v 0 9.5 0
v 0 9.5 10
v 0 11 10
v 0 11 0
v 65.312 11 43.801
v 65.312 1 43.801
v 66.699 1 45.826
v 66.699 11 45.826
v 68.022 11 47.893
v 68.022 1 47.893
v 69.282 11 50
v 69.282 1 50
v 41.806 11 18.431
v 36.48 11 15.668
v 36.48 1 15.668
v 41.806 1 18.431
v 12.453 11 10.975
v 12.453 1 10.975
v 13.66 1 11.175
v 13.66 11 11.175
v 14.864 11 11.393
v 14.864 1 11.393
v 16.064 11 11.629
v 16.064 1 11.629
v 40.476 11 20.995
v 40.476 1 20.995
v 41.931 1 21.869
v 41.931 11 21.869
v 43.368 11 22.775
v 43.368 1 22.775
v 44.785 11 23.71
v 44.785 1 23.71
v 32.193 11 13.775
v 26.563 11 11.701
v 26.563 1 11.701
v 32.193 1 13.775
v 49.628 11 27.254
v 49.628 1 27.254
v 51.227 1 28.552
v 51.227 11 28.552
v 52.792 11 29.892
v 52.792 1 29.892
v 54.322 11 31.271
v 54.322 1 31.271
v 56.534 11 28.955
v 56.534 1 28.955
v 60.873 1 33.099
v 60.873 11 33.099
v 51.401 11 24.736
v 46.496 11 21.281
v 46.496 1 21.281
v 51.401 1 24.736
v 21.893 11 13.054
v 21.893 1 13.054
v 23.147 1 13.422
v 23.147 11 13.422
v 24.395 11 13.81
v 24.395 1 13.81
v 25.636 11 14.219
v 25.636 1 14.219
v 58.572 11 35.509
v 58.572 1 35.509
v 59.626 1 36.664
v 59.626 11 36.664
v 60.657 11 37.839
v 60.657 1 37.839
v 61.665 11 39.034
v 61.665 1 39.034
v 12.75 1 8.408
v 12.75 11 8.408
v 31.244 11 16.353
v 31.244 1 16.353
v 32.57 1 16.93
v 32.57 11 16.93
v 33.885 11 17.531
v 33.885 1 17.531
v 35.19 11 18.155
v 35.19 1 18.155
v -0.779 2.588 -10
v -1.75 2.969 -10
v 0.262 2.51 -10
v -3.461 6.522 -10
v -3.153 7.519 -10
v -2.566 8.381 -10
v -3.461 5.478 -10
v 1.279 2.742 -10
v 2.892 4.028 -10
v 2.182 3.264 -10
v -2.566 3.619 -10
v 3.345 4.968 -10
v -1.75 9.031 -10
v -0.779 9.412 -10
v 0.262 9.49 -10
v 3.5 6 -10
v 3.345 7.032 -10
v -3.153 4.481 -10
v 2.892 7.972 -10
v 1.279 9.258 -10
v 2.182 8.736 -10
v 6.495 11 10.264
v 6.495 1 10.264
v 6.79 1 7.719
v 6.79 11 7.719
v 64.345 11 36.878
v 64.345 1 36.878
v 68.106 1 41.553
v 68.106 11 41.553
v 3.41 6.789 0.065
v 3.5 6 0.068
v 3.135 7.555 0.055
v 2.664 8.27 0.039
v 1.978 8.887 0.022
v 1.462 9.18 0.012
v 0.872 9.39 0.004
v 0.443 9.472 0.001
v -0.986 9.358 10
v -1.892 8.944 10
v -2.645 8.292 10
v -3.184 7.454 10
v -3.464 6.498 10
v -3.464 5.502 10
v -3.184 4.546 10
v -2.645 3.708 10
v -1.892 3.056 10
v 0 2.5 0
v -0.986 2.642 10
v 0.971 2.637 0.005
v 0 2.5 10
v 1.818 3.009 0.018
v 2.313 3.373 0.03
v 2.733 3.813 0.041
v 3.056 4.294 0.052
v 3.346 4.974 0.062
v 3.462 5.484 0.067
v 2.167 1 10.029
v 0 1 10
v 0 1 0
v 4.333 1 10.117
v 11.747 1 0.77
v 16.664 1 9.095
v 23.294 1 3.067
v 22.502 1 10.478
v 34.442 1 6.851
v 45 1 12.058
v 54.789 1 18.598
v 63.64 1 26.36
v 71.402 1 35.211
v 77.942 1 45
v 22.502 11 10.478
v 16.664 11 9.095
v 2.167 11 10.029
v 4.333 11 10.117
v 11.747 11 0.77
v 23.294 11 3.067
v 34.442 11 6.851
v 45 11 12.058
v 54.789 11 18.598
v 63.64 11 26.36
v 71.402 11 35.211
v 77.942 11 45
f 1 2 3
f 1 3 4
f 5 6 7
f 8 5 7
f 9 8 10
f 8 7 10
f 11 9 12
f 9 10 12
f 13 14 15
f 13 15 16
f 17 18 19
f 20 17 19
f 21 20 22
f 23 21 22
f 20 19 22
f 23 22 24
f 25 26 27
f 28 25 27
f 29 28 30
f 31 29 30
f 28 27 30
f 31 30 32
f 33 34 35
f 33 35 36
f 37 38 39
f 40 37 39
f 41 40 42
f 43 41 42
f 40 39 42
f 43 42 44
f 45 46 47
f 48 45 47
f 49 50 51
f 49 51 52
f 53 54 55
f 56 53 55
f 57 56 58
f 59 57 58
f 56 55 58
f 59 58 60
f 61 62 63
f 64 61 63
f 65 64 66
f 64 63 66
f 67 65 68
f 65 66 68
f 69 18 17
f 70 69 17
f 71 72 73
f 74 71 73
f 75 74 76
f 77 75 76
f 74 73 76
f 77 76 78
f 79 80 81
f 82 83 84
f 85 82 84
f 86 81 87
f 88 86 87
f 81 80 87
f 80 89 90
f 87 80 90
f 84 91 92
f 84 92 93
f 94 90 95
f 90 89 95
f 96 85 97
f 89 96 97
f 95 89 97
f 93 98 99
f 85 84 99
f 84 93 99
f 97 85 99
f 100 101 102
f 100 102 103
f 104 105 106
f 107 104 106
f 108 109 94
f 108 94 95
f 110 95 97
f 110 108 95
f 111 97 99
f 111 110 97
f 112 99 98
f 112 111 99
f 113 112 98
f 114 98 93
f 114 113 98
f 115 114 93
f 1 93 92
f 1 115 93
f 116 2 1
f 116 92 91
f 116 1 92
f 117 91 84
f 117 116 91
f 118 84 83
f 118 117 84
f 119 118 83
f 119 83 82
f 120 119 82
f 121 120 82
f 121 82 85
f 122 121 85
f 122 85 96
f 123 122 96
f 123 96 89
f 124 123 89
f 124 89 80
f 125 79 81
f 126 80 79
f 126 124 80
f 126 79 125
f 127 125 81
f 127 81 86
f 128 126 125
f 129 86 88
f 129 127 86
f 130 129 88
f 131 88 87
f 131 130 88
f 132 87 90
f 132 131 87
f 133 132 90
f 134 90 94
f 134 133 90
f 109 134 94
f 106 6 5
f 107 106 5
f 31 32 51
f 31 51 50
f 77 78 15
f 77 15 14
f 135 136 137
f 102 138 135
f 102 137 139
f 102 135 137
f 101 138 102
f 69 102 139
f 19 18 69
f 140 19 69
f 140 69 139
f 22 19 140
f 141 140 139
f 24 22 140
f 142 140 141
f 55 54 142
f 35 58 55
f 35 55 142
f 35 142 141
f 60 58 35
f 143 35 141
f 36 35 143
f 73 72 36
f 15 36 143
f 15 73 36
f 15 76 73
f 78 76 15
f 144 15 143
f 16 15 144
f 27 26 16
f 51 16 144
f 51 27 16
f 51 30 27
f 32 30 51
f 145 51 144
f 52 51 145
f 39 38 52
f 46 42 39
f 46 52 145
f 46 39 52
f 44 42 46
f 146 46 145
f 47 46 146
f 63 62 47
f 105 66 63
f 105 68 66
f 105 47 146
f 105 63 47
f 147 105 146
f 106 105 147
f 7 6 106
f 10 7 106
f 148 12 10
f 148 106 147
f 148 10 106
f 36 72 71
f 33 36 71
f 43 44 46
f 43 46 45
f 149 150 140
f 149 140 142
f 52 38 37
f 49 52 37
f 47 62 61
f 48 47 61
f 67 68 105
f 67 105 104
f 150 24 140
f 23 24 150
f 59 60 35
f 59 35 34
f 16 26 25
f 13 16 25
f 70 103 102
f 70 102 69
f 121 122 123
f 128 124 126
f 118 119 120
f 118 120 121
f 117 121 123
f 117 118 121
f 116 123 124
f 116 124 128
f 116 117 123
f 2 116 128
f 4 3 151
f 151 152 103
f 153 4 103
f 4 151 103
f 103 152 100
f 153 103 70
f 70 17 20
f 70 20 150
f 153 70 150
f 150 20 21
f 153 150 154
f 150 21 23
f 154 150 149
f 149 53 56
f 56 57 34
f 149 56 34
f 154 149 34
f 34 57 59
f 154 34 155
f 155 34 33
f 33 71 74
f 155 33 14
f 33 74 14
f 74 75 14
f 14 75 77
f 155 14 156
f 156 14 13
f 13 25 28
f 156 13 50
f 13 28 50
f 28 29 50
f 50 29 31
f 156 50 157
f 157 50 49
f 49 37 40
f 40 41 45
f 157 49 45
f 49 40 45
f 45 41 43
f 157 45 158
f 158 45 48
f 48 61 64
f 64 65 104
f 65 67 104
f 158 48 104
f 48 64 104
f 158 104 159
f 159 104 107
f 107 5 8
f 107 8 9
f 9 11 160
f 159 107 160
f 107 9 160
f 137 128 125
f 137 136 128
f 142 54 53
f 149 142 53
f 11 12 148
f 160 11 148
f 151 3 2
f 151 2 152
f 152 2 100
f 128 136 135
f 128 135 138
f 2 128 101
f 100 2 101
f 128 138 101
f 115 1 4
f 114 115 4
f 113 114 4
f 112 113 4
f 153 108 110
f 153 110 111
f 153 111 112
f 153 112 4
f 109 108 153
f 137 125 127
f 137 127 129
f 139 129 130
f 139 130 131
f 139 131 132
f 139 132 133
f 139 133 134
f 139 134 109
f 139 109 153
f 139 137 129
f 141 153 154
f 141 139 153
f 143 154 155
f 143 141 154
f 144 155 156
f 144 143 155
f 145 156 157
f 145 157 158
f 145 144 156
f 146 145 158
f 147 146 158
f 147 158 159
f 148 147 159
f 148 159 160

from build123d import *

# Parameters (mm, degrees)
SKETCH001_R                = 3.5
EXTRUDE001_DEPTH           = 10
SKETCH012_W                = 6
SKETCH012_H                = 10
EXTRUDE013_DEPTH           = 2.5
EXTRUDE013_PLACEMENT_ANGLE = 51.18
SKETCH011_W                = 6
SKETCH011_H                = 10
EXTRUDE012_DEPTH           = 2.5
EXTRUDE012_PLACEMENT_ANGLE = 43.68
SKETCH010_W                = 6
SKETCH010_H                = 10
EXTRUDE011_DEPTH           = 2.5
EXTRUDE011_PLACEMENT_ANGLE = 35.16
SKETCH009_W                = 6
SKETCH009_H                = 10
EXTRUDE010_DEPTH           = 2.5
EXTRUDE010_PLACEMENT_ANGLE = 27.42
SKETCH008_W                = 6
SKETCH008_H                = 10
EXTRUDE009_DEPTH           = 2.5
EXTRUDE009_PLACEMENT_ANGLE = 20.22
SKETCH007_W                = 6
SKETCH007_H                = 10
EXTRUDE008_DEPTH           = 2.5
EXTRUDE008_PLACEMENT_ANGLE = 13.32
SKETCH005_W                = 6
SKETCH005_H                = 10
EXTRUDE006_DEPTH           = 2.5
EXTRUDE006_PLACEMENT_ANGLE = 6.6
EXTRUDE002_DEPTH           = 5


with BuildPart() as extrude001:
    # Sketch001 → Extrude001 (new body, symmetric)
    with BuildSketch(Plane.XY):
        Circle(SKETCH001_R)
    extrude(amount=EXTRUDE001_DEPTH, both=True)


with BuildPart() as extrude013:
    # Sketch012 → Extrude013 (new body, symmetric)
    with BuildSketch(Plane.XY):
        Rectangle(SKETCH012_W, SKETCH012_H)
    extrude(amount=EXTRUDE013_DEPTH, both=True)


with BuildPart() as extrude013_1:
    # Extrude013 placement: moved
    add(extrude013.part.moved(Location((64.277333, 0, 40.782745))).rotate(Axis((64.277333, 0, 40.782745), (0, -1, 0)), EXTRUDE013_PLACEMENT_ANGLE))


with BuildPart() as extrude012:
    # Sketch011 → Extrude012 (new body, symmetric)
    with BuildSketch(Plane.XY):
        Rectangle(SKETCH011_W, SKETCH011_H)
    extrude(amount=EXTRUDE012_DEPTH, both=True)


with BuildPart() as extrude012_1:
    # Extrude012 placement: moved
    add(extrude012.part.moved(Location((56.976975, 0, 32.835318))).rotate(Axis((56.976975, 0, 32.835318), (0, -1, 0)), EXTRUDE012_PLACEMENT_ANGLE))


with BuildPart() as extrude011:
    # Sketch010 → Extrude011 (new body, symmetric)
    with BuildSketch(Plane.XY):
        Rectangle(SKETCH010_W, SKETCH010_H)
    extrude(amount=EXTRUDE011_DEPTH, both=True)


with BuildPart() as extrude011_1:
    # Extrude011 placement: moved
    add(extrude011.part.moved(Location((47.50859, 0, 25.052362))).rotate(Axis((47.50859, 0, 25.052362), (0, -1, 0)), EXTRUDE011_PLACEMENT_ANGLE))


with BuildPart() as extrude010:
    # Sketch009 → Extrude010 (new body, symmetric)
    with BuildSketch(Plane.XY):
        Rectangle(SKETCH009_W, SKETCH009_H)
    extrude(amount=EXTRUDE010_DEPTH, both=True)


with BuildPart() as extrude010_1:
    # Extrude010 placement: moved
    add(extrude010.part.moved(Location((37.992047, 0, 19.268488))).rotate(Axis((37.992047, 0, 19.268488), (0, -1, 0)), EXTRUDE010_PLACEMENT_ANGLE))


with BuildPart() as extrude009:
    # Sketch008 → Extrude009 (new body, symmetric)
    with BuildSketch(Plane.XY):
        Rectangle(SKETCH008_W, SKETCH008_H)
    extrude(amount=EXTRUDE009_DEPTH, both=True)


with BuildPart() as extrude009_1:
    # Extrude009 placement: moved
    add(extrude009.part.moved(Location((28.514126, 0, 15.084274))).rotate(Axis((28.514126, 0, 15.084274), (0, -1, 0)), EXTRUDE009_PLACEMENT_ANGLE))


with BuildPart() as extrude008:
    # Sketch007 → Extrude008 (new body, symmetric)
    with BuildSketch(Plane.XY):
        Rectangle(SKETCH007_W, SKETCH007_H)
    extrude(amount=EXTRUDE008_DEPTH, both=True)


with BuildPart() as extrude008_1:
    # Extrude008 placement: moved
    add(extrude008.part.moved(Location((19.007128, 0, 12.219373))).rotate(Axis((19.007128, 0, 12.219373), (0, -1, 0)), EXTRUDE008_PLACEMENT_ANGLE))


with BuildPart() as extrude006:
    # Sketch005 → Extrude006 (new body, symmetric)
    with BuildSketch(Plane.XY):
        Rectangle(SKETCH005_W, SKETCH005_H)
    extrude(amount=EXTRUDE006_DEPTH, both=True)


with BuildPart() as extrude006_1:
    # Extrude006 placement: moved
    add(extrude006.part.moved(Location((9.482315, 0, 10.546747))).rotate(Axis((9.482315, 0, 10.546747), (0, -1, 0)), EXTRUDE006_PLACEMENT_ANGLE))


with BuildPart() as fusion:
    # Sketch002 → Extrude002 (new body, symmetric)
    with BuildSketch(Plane.XZ):
        with BuildLine():
            ThreePointArc((0, 0), (45.00001, 12.057678), (77.942322, 44.999938))
            Line((69.282072, 49.999945), (77.942322, 44.999938))
            ThreePointArc((0, 10), (40.000013, 20.717934), (69.282072, 49.999945))
            Line((0, 10), (0, 0))
        make_face()
    extrude(amount=EXTRUDE002_DEPTH, both=True)

    # Cut: cut Extrude006
    add(extrude006_1.part, mode=Mode.SUBTRACT)

    # Cut001: cut Extrude008
    add(extrude008_1.part, mode=Mode.SUBTRACT)

    # Cut002: cut Extrude009
    add(extrude009_1.part, mode=Mode.SUBTRACT)

    # Cut003: cut Extrude010
    add(extrude010_1.part, mode=Mode.SUBTRACT)

    # Cut004: cut Extrude011
    add(extrude011_1.part, mode=Mode.SUBTRACT)

    # Cut005: cut Extrude012
    add(extrude012_1.part, mode=Mode.SUBTRACT)

    # Cut006: cut Extrude013
    add(extrude013_1.part, mode=Mode.SUBTRACT)

    # Fusion: union Extrude001
    add(extrude001.part)


with BuildPart() as fusion_1:
    # Fusion placement: moved
    add(fusion.part.moved(Location((0, 6, 0))))


solid = fusion_1.part
